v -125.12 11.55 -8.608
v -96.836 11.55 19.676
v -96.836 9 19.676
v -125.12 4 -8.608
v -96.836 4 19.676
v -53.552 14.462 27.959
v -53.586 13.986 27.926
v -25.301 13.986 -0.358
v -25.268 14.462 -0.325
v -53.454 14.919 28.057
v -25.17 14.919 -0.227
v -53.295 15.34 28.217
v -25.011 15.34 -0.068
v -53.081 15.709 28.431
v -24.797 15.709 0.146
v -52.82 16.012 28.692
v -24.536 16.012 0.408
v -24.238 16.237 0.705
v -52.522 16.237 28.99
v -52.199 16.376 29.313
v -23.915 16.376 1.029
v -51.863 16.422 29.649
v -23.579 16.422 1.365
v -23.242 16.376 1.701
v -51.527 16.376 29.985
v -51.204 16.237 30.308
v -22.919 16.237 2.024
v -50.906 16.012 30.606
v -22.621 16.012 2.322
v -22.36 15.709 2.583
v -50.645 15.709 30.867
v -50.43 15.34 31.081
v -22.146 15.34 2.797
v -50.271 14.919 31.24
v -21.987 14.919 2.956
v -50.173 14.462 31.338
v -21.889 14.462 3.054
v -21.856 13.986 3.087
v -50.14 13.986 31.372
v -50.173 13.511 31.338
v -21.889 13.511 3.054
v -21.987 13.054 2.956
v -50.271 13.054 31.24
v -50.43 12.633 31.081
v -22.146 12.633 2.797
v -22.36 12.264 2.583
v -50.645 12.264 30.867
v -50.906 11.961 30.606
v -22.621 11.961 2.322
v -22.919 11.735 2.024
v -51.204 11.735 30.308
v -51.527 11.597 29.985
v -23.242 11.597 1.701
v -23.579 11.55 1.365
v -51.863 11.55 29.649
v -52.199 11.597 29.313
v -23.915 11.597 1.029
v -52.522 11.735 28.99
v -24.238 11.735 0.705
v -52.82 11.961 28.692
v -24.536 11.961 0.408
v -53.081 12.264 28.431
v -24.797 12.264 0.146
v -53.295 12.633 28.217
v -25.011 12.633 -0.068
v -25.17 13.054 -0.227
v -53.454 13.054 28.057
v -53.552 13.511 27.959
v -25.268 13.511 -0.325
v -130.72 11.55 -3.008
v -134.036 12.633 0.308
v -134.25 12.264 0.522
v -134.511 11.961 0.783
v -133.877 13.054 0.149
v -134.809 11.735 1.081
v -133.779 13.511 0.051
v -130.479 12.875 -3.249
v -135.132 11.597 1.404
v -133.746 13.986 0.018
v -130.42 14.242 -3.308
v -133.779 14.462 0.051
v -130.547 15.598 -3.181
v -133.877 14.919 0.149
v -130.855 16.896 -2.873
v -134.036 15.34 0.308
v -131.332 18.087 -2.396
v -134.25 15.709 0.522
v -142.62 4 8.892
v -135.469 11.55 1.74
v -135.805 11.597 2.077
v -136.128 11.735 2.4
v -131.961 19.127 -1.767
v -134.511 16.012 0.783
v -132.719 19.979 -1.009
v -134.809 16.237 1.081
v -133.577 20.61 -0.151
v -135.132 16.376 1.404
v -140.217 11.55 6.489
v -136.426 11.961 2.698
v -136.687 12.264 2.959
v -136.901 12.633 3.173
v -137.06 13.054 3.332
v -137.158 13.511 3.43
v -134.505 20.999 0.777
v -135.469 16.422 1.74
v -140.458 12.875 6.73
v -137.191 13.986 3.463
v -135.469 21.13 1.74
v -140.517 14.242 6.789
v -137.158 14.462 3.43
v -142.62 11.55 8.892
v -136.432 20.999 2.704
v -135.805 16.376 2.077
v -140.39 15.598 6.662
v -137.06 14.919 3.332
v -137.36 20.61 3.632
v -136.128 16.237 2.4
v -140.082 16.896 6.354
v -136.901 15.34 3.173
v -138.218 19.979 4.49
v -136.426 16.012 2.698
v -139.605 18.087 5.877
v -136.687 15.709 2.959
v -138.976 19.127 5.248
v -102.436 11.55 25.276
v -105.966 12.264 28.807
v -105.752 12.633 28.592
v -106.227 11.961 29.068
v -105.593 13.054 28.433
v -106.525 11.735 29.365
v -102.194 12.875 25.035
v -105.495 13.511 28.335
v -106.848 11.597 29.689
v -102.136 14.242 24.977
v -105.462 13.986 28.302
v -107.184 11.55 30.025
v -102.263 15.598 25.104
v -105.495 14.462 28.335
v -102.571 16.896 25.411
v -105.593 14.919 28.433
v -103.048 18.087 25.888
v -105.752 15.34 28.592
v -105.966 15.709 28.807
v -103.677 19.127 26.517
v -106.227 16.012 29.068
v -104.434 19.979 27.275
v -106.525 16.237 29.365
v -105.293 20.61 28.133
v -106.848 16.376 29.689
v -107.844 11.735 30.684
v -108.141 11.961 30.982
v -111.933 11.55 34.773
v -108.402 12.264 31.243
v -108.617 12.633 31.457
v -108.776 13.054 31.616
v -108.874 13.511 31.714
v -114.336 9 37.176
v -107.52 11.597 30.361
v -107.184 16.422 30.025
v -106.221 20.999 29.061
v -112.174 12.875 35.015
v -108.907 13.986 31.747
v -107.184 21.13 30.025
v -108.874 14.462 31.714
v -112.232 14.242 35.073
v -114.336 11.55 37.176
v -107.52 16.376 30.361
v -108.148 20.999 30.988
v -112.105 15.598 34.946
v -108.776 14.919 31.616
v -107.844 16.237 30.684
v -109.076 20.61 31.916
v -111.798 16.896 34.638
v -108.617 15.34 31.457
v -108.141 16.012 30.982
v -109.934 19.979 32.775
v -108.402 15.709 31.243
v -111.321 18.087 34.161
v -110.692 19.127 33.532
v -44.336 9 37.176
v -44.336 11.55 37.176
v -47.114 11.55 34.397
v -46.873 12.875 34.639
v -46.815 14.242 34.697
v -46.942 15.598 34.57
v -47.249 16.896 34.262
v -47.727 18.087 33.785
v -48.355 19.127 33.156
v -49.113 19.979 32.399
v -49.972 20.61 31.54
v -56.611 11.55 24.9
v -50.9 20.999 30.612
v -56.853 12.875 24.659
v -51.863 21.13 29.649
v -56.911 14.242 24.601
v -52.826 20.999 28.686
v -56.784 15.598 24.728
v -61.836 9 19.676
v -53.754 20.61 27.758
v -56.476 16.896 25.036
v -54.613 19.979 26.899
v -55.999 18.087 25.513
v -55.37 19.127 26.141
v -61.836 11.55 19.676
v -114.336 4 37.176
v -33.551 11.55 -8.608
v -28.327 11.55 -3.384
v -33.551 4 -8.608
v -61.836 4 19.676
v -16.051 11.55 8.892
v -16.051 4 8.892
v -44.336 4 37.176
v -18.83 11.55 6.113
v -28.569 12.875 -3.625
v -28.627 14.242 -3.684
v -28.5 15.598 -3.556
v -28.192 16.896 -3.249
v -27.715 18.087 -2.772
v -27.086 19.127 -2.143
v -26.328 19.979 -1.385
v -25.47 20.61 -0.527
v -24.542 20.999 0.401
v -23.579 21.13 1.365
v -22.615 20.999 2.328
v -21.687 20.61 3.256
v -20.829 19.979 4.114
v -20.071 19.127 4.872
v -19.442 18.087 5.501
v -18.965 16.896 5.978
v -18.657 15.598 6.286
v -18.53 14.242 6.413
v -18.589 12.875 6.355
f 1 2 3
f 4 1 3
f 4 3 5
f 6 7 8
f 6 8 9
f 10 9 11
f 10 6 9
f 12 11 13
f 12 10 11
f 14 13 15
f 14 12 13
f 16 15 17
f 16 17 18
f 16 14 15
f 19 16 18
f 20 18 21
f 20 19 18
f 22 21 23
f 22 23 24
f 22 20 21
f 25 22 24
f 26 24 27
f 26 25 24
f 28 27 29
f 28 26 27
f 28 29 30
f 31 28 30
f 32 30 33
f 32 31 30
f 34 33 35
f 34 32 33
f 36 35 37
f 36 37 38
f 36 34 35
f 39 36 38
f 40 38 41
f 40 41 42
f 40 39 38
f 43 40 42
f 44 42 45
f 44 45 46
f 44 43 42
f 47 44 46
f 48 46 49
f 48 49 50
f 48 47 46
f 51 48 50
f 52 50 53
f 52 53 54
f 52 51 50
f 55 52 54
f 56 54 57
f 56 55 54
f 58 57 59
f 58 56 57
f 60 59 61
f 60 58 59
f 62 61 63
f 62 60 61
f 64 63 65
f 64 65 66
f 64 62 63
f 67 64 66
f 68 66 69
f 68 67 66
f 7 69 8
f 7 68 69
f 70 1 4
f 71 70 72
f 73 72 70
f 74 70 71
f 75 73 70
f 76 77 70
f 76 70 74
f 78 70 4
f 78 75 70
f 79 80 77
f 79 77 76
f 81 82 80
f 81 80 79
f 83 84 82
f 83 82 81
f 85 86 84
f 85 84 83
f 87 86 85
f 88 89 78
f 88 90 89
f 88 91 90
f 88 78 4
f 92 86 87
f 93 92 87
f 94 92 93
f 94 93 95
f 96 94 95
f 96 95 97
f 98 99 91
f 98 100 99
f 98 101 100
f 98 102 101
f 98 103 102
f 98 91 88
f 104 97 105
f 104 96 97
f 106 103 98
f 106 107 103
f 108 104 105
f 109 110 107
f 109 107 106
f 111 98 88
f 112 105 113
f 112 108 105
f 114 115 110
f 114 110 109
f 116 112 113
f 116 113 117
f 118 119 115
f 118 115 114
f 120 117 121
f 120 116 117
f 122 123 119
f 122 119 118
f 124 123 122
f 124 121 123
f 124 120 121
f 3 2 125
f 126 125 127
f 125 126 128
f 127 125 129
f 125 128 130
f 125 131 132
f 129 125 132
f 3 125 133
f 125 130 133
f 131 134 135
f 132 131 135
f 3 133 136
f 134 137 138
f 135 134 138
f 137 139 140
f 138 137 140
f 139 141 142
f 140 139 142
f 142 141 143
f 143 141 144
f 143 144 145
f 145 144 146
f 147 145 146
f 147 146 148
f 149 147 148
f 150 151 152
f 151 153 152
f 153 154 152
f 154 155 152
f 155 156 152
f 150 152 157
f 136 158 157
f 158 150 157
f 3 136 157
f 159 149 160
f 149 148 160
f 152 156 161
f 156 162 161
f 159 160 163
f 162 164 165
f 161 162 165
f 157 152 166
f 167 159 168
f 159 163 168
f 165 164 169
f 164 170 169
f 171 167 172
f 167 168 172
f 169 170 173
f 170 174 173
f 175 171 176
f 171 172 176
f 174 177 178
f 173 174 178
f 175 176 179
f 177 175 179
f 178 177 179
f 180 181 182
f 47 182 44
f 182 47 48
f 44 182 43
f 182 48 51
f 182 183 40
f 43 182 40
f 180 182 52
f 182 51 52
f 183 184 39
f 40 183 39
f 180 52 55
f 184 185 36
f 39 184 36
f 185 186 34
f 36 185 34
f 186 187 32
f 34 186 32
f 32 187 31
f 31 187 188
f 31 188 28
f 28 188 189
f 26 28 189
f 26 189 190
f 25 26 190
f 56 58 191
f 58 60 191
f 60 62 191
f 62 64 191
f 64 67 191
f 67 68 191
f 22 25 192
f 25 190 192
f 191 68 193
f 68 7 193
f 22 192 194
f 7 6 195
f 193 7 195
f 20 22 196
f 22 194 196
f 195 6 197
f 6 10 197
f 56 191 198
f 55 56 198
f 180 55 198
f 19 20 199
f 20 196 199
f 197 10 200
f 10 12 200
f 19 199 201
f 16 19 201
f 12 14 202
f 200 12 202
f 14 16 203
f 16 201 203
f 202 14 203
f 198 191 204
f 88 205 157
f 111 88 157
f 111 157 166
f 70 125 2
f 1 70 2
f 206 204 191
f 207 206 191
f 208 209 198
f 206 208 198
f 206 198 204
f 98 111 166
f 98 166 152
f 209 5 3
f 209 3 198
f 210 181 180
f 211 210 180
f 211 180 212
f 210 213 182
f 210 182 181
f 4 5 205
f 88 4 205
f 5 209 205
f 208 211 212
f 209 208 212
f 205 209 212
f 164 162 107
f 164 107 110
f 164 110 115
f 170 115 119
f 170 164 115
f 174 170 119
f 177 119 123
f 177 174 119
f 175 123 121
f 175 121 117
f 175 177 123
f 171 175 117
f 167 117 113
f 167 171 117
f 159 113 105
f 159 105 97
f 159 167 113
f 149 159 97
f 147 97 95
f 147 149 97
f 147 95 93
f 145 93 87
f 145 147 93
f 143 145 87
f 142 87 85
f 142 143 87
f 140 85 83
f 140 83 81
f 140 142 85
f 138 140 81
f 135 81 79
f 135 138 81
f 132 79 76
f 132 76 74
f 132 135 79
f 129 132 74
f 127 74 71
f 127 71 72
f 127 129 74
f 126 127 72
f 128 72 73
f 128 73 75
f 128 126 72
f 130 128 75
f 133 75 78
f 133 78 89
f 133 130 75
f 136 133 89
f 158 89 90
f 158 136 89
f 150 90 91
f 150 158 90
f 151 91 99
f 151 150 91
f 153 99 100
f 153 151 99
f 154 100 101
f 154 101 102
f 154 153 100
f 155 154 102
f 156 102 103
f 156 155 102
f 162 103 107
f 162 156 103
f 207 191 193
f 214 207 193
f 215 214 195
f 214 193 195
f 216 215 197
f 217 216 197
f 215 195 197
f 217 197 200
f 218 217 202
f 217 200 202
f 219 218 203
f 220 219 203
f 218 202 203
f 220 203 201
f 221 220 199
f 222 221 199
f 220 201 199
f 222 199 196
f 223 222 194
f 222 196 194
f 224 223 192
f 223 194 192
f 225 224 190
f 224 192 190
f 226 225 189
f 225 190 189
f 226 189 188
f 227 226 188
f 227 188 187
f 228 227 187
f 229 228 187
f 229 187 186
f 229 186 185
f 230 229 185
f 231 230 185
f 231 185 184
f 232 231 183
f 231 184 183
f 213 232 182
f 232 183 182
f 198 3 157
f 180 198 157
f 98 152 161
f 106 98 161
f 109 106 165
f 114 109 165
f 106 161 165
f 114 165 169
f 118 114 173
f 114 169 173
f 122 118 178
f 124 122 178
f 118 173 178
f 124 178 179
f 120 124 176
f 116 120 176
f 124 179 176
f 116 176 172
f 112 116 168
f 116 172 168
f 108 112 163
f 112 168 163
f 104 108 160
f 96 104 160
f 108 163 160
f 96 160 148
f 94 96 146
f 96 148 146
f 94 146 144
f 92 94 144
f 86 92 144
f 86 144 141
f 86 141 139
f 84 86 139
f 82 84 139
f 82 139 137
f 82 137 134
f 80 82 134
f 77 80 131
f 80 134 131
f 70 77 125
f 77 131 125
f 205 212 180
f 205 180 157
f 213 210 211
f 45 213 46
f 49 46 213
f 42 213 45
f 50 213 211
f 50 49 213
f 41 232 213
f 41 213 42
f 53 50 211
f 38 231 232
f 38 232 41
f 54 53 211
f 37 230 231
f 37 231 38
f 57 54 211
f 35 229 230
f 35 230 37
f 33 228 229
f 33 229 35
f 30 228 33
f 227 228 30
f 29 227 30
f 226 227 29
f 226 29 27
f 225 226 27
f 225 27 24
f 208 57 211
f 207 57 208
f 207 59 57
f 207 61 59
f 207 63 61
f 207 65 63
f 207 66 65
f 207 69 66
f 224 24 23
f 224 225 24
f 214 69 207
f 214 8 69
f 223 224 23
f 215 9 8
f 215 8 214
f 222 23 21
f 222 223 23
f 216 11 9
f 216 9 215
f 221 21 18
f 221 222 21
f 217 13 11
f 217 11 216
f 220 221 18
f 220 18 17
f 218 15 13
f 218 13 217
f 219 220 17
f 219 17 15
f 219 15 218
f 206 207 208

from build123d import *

# Parameters (mm, degrees)
BOSS_EXTRUDE1_START = 4
BOSS_EXTRUDE1_DEPTH = 5
ANTENNAHOLSTER1_R   = 2.43625
BOSS_EXTRUDE2_DEPTH = 40
ANTENNAHOLSTER2_R   = 2.43625
BOSS_EXTRUDE3_DEPTH = 40


with BuildPart() as part:
    # Trapezoid1 → Boss-Extrude1 (new body)
    with BuildSketch(Plane(origin=(0, 0, 0), x_dir=(1, 0, 0), z_dir=(0, 1, 0)).offset(BOSS_EXTRUDE1_START)):
        Polygon((-114.335639632, -37.176097112), (-96.835639632, -19.676097112), (-61.835639632, -19.676097112), (-44.335639632, -37.176097112), align=None)
    extrude(amount=BOSS_EXTRUDE1_DEPTH)

    # AntennaHolster1 → Boss-Extrude2 (add)
    with BuildSketch(Plane(origin=(-40.755868372, 0, 40.755868372), x_dir=(-0.7071067811865513, 0, -0.7071067811865438), z_dir=(0.7071067811865438, 0, -0.7071067811865513))):
        with BuildLine():
            Line((5.062561066, 11.55), (5.062561066, 4))
            Line((5.062561066, 4), (29.811298407, 4))
            Line((29.811298407, 4), (29.811298407, 11.55))
            Line((29.811298407, 11.55), (22.423126617, 11.55))
            ThreePointArc((22.423126617, 11.55), (15.707633336, 21.13), (8.992140056, 11.55))
            Line((8.992140056, 11.55), (5.062561066, 11.55))
        make_face()
        with Locations((15.707633336, 13.98625)):
            Circle(ANTENNAHOLSTER1_R, mode=Mode.SUBTRACT)
    extrude(amount=BOSS_EXTRUDE2_DEPTH)

    # AntennaHolster2 → Boss-Extrude3 (add)
    with BuildSketch(Plane(origin=(-38.57977126, 0, -38.57977126), x_dir=(-0.7071067811865462, 0, 0.7071067811865489), z_dir=(-0.7071067811865489, 0, -0.7071067811865462))):
        with BuildLine():
            Line((82.38623914, 11.55), (82.38623914, 4))
            Line((82.38623914, 4), (107.134976481, 4))
            Line((107.134976481, 4), (107.134976481, 11.55))
            Line((107.134976481, 11.55), (103.736913224, 11.55))
            ThreePointArc((103.736913224, 11.55), (97.021419943, 21.13), (90.305926663, 11.55))
            Line((90.305926663, 11.55), (82.38623914, 11.55))
        make_face()
        with Locations((97.021419943, 13.98625)):
            Circle(ANTENNAHOLSTER2_R, mode=Mode.SUBTRACT)
    extrude(amount=BOSS_EXTRUDE3_DEPTH)


solid = part.part
